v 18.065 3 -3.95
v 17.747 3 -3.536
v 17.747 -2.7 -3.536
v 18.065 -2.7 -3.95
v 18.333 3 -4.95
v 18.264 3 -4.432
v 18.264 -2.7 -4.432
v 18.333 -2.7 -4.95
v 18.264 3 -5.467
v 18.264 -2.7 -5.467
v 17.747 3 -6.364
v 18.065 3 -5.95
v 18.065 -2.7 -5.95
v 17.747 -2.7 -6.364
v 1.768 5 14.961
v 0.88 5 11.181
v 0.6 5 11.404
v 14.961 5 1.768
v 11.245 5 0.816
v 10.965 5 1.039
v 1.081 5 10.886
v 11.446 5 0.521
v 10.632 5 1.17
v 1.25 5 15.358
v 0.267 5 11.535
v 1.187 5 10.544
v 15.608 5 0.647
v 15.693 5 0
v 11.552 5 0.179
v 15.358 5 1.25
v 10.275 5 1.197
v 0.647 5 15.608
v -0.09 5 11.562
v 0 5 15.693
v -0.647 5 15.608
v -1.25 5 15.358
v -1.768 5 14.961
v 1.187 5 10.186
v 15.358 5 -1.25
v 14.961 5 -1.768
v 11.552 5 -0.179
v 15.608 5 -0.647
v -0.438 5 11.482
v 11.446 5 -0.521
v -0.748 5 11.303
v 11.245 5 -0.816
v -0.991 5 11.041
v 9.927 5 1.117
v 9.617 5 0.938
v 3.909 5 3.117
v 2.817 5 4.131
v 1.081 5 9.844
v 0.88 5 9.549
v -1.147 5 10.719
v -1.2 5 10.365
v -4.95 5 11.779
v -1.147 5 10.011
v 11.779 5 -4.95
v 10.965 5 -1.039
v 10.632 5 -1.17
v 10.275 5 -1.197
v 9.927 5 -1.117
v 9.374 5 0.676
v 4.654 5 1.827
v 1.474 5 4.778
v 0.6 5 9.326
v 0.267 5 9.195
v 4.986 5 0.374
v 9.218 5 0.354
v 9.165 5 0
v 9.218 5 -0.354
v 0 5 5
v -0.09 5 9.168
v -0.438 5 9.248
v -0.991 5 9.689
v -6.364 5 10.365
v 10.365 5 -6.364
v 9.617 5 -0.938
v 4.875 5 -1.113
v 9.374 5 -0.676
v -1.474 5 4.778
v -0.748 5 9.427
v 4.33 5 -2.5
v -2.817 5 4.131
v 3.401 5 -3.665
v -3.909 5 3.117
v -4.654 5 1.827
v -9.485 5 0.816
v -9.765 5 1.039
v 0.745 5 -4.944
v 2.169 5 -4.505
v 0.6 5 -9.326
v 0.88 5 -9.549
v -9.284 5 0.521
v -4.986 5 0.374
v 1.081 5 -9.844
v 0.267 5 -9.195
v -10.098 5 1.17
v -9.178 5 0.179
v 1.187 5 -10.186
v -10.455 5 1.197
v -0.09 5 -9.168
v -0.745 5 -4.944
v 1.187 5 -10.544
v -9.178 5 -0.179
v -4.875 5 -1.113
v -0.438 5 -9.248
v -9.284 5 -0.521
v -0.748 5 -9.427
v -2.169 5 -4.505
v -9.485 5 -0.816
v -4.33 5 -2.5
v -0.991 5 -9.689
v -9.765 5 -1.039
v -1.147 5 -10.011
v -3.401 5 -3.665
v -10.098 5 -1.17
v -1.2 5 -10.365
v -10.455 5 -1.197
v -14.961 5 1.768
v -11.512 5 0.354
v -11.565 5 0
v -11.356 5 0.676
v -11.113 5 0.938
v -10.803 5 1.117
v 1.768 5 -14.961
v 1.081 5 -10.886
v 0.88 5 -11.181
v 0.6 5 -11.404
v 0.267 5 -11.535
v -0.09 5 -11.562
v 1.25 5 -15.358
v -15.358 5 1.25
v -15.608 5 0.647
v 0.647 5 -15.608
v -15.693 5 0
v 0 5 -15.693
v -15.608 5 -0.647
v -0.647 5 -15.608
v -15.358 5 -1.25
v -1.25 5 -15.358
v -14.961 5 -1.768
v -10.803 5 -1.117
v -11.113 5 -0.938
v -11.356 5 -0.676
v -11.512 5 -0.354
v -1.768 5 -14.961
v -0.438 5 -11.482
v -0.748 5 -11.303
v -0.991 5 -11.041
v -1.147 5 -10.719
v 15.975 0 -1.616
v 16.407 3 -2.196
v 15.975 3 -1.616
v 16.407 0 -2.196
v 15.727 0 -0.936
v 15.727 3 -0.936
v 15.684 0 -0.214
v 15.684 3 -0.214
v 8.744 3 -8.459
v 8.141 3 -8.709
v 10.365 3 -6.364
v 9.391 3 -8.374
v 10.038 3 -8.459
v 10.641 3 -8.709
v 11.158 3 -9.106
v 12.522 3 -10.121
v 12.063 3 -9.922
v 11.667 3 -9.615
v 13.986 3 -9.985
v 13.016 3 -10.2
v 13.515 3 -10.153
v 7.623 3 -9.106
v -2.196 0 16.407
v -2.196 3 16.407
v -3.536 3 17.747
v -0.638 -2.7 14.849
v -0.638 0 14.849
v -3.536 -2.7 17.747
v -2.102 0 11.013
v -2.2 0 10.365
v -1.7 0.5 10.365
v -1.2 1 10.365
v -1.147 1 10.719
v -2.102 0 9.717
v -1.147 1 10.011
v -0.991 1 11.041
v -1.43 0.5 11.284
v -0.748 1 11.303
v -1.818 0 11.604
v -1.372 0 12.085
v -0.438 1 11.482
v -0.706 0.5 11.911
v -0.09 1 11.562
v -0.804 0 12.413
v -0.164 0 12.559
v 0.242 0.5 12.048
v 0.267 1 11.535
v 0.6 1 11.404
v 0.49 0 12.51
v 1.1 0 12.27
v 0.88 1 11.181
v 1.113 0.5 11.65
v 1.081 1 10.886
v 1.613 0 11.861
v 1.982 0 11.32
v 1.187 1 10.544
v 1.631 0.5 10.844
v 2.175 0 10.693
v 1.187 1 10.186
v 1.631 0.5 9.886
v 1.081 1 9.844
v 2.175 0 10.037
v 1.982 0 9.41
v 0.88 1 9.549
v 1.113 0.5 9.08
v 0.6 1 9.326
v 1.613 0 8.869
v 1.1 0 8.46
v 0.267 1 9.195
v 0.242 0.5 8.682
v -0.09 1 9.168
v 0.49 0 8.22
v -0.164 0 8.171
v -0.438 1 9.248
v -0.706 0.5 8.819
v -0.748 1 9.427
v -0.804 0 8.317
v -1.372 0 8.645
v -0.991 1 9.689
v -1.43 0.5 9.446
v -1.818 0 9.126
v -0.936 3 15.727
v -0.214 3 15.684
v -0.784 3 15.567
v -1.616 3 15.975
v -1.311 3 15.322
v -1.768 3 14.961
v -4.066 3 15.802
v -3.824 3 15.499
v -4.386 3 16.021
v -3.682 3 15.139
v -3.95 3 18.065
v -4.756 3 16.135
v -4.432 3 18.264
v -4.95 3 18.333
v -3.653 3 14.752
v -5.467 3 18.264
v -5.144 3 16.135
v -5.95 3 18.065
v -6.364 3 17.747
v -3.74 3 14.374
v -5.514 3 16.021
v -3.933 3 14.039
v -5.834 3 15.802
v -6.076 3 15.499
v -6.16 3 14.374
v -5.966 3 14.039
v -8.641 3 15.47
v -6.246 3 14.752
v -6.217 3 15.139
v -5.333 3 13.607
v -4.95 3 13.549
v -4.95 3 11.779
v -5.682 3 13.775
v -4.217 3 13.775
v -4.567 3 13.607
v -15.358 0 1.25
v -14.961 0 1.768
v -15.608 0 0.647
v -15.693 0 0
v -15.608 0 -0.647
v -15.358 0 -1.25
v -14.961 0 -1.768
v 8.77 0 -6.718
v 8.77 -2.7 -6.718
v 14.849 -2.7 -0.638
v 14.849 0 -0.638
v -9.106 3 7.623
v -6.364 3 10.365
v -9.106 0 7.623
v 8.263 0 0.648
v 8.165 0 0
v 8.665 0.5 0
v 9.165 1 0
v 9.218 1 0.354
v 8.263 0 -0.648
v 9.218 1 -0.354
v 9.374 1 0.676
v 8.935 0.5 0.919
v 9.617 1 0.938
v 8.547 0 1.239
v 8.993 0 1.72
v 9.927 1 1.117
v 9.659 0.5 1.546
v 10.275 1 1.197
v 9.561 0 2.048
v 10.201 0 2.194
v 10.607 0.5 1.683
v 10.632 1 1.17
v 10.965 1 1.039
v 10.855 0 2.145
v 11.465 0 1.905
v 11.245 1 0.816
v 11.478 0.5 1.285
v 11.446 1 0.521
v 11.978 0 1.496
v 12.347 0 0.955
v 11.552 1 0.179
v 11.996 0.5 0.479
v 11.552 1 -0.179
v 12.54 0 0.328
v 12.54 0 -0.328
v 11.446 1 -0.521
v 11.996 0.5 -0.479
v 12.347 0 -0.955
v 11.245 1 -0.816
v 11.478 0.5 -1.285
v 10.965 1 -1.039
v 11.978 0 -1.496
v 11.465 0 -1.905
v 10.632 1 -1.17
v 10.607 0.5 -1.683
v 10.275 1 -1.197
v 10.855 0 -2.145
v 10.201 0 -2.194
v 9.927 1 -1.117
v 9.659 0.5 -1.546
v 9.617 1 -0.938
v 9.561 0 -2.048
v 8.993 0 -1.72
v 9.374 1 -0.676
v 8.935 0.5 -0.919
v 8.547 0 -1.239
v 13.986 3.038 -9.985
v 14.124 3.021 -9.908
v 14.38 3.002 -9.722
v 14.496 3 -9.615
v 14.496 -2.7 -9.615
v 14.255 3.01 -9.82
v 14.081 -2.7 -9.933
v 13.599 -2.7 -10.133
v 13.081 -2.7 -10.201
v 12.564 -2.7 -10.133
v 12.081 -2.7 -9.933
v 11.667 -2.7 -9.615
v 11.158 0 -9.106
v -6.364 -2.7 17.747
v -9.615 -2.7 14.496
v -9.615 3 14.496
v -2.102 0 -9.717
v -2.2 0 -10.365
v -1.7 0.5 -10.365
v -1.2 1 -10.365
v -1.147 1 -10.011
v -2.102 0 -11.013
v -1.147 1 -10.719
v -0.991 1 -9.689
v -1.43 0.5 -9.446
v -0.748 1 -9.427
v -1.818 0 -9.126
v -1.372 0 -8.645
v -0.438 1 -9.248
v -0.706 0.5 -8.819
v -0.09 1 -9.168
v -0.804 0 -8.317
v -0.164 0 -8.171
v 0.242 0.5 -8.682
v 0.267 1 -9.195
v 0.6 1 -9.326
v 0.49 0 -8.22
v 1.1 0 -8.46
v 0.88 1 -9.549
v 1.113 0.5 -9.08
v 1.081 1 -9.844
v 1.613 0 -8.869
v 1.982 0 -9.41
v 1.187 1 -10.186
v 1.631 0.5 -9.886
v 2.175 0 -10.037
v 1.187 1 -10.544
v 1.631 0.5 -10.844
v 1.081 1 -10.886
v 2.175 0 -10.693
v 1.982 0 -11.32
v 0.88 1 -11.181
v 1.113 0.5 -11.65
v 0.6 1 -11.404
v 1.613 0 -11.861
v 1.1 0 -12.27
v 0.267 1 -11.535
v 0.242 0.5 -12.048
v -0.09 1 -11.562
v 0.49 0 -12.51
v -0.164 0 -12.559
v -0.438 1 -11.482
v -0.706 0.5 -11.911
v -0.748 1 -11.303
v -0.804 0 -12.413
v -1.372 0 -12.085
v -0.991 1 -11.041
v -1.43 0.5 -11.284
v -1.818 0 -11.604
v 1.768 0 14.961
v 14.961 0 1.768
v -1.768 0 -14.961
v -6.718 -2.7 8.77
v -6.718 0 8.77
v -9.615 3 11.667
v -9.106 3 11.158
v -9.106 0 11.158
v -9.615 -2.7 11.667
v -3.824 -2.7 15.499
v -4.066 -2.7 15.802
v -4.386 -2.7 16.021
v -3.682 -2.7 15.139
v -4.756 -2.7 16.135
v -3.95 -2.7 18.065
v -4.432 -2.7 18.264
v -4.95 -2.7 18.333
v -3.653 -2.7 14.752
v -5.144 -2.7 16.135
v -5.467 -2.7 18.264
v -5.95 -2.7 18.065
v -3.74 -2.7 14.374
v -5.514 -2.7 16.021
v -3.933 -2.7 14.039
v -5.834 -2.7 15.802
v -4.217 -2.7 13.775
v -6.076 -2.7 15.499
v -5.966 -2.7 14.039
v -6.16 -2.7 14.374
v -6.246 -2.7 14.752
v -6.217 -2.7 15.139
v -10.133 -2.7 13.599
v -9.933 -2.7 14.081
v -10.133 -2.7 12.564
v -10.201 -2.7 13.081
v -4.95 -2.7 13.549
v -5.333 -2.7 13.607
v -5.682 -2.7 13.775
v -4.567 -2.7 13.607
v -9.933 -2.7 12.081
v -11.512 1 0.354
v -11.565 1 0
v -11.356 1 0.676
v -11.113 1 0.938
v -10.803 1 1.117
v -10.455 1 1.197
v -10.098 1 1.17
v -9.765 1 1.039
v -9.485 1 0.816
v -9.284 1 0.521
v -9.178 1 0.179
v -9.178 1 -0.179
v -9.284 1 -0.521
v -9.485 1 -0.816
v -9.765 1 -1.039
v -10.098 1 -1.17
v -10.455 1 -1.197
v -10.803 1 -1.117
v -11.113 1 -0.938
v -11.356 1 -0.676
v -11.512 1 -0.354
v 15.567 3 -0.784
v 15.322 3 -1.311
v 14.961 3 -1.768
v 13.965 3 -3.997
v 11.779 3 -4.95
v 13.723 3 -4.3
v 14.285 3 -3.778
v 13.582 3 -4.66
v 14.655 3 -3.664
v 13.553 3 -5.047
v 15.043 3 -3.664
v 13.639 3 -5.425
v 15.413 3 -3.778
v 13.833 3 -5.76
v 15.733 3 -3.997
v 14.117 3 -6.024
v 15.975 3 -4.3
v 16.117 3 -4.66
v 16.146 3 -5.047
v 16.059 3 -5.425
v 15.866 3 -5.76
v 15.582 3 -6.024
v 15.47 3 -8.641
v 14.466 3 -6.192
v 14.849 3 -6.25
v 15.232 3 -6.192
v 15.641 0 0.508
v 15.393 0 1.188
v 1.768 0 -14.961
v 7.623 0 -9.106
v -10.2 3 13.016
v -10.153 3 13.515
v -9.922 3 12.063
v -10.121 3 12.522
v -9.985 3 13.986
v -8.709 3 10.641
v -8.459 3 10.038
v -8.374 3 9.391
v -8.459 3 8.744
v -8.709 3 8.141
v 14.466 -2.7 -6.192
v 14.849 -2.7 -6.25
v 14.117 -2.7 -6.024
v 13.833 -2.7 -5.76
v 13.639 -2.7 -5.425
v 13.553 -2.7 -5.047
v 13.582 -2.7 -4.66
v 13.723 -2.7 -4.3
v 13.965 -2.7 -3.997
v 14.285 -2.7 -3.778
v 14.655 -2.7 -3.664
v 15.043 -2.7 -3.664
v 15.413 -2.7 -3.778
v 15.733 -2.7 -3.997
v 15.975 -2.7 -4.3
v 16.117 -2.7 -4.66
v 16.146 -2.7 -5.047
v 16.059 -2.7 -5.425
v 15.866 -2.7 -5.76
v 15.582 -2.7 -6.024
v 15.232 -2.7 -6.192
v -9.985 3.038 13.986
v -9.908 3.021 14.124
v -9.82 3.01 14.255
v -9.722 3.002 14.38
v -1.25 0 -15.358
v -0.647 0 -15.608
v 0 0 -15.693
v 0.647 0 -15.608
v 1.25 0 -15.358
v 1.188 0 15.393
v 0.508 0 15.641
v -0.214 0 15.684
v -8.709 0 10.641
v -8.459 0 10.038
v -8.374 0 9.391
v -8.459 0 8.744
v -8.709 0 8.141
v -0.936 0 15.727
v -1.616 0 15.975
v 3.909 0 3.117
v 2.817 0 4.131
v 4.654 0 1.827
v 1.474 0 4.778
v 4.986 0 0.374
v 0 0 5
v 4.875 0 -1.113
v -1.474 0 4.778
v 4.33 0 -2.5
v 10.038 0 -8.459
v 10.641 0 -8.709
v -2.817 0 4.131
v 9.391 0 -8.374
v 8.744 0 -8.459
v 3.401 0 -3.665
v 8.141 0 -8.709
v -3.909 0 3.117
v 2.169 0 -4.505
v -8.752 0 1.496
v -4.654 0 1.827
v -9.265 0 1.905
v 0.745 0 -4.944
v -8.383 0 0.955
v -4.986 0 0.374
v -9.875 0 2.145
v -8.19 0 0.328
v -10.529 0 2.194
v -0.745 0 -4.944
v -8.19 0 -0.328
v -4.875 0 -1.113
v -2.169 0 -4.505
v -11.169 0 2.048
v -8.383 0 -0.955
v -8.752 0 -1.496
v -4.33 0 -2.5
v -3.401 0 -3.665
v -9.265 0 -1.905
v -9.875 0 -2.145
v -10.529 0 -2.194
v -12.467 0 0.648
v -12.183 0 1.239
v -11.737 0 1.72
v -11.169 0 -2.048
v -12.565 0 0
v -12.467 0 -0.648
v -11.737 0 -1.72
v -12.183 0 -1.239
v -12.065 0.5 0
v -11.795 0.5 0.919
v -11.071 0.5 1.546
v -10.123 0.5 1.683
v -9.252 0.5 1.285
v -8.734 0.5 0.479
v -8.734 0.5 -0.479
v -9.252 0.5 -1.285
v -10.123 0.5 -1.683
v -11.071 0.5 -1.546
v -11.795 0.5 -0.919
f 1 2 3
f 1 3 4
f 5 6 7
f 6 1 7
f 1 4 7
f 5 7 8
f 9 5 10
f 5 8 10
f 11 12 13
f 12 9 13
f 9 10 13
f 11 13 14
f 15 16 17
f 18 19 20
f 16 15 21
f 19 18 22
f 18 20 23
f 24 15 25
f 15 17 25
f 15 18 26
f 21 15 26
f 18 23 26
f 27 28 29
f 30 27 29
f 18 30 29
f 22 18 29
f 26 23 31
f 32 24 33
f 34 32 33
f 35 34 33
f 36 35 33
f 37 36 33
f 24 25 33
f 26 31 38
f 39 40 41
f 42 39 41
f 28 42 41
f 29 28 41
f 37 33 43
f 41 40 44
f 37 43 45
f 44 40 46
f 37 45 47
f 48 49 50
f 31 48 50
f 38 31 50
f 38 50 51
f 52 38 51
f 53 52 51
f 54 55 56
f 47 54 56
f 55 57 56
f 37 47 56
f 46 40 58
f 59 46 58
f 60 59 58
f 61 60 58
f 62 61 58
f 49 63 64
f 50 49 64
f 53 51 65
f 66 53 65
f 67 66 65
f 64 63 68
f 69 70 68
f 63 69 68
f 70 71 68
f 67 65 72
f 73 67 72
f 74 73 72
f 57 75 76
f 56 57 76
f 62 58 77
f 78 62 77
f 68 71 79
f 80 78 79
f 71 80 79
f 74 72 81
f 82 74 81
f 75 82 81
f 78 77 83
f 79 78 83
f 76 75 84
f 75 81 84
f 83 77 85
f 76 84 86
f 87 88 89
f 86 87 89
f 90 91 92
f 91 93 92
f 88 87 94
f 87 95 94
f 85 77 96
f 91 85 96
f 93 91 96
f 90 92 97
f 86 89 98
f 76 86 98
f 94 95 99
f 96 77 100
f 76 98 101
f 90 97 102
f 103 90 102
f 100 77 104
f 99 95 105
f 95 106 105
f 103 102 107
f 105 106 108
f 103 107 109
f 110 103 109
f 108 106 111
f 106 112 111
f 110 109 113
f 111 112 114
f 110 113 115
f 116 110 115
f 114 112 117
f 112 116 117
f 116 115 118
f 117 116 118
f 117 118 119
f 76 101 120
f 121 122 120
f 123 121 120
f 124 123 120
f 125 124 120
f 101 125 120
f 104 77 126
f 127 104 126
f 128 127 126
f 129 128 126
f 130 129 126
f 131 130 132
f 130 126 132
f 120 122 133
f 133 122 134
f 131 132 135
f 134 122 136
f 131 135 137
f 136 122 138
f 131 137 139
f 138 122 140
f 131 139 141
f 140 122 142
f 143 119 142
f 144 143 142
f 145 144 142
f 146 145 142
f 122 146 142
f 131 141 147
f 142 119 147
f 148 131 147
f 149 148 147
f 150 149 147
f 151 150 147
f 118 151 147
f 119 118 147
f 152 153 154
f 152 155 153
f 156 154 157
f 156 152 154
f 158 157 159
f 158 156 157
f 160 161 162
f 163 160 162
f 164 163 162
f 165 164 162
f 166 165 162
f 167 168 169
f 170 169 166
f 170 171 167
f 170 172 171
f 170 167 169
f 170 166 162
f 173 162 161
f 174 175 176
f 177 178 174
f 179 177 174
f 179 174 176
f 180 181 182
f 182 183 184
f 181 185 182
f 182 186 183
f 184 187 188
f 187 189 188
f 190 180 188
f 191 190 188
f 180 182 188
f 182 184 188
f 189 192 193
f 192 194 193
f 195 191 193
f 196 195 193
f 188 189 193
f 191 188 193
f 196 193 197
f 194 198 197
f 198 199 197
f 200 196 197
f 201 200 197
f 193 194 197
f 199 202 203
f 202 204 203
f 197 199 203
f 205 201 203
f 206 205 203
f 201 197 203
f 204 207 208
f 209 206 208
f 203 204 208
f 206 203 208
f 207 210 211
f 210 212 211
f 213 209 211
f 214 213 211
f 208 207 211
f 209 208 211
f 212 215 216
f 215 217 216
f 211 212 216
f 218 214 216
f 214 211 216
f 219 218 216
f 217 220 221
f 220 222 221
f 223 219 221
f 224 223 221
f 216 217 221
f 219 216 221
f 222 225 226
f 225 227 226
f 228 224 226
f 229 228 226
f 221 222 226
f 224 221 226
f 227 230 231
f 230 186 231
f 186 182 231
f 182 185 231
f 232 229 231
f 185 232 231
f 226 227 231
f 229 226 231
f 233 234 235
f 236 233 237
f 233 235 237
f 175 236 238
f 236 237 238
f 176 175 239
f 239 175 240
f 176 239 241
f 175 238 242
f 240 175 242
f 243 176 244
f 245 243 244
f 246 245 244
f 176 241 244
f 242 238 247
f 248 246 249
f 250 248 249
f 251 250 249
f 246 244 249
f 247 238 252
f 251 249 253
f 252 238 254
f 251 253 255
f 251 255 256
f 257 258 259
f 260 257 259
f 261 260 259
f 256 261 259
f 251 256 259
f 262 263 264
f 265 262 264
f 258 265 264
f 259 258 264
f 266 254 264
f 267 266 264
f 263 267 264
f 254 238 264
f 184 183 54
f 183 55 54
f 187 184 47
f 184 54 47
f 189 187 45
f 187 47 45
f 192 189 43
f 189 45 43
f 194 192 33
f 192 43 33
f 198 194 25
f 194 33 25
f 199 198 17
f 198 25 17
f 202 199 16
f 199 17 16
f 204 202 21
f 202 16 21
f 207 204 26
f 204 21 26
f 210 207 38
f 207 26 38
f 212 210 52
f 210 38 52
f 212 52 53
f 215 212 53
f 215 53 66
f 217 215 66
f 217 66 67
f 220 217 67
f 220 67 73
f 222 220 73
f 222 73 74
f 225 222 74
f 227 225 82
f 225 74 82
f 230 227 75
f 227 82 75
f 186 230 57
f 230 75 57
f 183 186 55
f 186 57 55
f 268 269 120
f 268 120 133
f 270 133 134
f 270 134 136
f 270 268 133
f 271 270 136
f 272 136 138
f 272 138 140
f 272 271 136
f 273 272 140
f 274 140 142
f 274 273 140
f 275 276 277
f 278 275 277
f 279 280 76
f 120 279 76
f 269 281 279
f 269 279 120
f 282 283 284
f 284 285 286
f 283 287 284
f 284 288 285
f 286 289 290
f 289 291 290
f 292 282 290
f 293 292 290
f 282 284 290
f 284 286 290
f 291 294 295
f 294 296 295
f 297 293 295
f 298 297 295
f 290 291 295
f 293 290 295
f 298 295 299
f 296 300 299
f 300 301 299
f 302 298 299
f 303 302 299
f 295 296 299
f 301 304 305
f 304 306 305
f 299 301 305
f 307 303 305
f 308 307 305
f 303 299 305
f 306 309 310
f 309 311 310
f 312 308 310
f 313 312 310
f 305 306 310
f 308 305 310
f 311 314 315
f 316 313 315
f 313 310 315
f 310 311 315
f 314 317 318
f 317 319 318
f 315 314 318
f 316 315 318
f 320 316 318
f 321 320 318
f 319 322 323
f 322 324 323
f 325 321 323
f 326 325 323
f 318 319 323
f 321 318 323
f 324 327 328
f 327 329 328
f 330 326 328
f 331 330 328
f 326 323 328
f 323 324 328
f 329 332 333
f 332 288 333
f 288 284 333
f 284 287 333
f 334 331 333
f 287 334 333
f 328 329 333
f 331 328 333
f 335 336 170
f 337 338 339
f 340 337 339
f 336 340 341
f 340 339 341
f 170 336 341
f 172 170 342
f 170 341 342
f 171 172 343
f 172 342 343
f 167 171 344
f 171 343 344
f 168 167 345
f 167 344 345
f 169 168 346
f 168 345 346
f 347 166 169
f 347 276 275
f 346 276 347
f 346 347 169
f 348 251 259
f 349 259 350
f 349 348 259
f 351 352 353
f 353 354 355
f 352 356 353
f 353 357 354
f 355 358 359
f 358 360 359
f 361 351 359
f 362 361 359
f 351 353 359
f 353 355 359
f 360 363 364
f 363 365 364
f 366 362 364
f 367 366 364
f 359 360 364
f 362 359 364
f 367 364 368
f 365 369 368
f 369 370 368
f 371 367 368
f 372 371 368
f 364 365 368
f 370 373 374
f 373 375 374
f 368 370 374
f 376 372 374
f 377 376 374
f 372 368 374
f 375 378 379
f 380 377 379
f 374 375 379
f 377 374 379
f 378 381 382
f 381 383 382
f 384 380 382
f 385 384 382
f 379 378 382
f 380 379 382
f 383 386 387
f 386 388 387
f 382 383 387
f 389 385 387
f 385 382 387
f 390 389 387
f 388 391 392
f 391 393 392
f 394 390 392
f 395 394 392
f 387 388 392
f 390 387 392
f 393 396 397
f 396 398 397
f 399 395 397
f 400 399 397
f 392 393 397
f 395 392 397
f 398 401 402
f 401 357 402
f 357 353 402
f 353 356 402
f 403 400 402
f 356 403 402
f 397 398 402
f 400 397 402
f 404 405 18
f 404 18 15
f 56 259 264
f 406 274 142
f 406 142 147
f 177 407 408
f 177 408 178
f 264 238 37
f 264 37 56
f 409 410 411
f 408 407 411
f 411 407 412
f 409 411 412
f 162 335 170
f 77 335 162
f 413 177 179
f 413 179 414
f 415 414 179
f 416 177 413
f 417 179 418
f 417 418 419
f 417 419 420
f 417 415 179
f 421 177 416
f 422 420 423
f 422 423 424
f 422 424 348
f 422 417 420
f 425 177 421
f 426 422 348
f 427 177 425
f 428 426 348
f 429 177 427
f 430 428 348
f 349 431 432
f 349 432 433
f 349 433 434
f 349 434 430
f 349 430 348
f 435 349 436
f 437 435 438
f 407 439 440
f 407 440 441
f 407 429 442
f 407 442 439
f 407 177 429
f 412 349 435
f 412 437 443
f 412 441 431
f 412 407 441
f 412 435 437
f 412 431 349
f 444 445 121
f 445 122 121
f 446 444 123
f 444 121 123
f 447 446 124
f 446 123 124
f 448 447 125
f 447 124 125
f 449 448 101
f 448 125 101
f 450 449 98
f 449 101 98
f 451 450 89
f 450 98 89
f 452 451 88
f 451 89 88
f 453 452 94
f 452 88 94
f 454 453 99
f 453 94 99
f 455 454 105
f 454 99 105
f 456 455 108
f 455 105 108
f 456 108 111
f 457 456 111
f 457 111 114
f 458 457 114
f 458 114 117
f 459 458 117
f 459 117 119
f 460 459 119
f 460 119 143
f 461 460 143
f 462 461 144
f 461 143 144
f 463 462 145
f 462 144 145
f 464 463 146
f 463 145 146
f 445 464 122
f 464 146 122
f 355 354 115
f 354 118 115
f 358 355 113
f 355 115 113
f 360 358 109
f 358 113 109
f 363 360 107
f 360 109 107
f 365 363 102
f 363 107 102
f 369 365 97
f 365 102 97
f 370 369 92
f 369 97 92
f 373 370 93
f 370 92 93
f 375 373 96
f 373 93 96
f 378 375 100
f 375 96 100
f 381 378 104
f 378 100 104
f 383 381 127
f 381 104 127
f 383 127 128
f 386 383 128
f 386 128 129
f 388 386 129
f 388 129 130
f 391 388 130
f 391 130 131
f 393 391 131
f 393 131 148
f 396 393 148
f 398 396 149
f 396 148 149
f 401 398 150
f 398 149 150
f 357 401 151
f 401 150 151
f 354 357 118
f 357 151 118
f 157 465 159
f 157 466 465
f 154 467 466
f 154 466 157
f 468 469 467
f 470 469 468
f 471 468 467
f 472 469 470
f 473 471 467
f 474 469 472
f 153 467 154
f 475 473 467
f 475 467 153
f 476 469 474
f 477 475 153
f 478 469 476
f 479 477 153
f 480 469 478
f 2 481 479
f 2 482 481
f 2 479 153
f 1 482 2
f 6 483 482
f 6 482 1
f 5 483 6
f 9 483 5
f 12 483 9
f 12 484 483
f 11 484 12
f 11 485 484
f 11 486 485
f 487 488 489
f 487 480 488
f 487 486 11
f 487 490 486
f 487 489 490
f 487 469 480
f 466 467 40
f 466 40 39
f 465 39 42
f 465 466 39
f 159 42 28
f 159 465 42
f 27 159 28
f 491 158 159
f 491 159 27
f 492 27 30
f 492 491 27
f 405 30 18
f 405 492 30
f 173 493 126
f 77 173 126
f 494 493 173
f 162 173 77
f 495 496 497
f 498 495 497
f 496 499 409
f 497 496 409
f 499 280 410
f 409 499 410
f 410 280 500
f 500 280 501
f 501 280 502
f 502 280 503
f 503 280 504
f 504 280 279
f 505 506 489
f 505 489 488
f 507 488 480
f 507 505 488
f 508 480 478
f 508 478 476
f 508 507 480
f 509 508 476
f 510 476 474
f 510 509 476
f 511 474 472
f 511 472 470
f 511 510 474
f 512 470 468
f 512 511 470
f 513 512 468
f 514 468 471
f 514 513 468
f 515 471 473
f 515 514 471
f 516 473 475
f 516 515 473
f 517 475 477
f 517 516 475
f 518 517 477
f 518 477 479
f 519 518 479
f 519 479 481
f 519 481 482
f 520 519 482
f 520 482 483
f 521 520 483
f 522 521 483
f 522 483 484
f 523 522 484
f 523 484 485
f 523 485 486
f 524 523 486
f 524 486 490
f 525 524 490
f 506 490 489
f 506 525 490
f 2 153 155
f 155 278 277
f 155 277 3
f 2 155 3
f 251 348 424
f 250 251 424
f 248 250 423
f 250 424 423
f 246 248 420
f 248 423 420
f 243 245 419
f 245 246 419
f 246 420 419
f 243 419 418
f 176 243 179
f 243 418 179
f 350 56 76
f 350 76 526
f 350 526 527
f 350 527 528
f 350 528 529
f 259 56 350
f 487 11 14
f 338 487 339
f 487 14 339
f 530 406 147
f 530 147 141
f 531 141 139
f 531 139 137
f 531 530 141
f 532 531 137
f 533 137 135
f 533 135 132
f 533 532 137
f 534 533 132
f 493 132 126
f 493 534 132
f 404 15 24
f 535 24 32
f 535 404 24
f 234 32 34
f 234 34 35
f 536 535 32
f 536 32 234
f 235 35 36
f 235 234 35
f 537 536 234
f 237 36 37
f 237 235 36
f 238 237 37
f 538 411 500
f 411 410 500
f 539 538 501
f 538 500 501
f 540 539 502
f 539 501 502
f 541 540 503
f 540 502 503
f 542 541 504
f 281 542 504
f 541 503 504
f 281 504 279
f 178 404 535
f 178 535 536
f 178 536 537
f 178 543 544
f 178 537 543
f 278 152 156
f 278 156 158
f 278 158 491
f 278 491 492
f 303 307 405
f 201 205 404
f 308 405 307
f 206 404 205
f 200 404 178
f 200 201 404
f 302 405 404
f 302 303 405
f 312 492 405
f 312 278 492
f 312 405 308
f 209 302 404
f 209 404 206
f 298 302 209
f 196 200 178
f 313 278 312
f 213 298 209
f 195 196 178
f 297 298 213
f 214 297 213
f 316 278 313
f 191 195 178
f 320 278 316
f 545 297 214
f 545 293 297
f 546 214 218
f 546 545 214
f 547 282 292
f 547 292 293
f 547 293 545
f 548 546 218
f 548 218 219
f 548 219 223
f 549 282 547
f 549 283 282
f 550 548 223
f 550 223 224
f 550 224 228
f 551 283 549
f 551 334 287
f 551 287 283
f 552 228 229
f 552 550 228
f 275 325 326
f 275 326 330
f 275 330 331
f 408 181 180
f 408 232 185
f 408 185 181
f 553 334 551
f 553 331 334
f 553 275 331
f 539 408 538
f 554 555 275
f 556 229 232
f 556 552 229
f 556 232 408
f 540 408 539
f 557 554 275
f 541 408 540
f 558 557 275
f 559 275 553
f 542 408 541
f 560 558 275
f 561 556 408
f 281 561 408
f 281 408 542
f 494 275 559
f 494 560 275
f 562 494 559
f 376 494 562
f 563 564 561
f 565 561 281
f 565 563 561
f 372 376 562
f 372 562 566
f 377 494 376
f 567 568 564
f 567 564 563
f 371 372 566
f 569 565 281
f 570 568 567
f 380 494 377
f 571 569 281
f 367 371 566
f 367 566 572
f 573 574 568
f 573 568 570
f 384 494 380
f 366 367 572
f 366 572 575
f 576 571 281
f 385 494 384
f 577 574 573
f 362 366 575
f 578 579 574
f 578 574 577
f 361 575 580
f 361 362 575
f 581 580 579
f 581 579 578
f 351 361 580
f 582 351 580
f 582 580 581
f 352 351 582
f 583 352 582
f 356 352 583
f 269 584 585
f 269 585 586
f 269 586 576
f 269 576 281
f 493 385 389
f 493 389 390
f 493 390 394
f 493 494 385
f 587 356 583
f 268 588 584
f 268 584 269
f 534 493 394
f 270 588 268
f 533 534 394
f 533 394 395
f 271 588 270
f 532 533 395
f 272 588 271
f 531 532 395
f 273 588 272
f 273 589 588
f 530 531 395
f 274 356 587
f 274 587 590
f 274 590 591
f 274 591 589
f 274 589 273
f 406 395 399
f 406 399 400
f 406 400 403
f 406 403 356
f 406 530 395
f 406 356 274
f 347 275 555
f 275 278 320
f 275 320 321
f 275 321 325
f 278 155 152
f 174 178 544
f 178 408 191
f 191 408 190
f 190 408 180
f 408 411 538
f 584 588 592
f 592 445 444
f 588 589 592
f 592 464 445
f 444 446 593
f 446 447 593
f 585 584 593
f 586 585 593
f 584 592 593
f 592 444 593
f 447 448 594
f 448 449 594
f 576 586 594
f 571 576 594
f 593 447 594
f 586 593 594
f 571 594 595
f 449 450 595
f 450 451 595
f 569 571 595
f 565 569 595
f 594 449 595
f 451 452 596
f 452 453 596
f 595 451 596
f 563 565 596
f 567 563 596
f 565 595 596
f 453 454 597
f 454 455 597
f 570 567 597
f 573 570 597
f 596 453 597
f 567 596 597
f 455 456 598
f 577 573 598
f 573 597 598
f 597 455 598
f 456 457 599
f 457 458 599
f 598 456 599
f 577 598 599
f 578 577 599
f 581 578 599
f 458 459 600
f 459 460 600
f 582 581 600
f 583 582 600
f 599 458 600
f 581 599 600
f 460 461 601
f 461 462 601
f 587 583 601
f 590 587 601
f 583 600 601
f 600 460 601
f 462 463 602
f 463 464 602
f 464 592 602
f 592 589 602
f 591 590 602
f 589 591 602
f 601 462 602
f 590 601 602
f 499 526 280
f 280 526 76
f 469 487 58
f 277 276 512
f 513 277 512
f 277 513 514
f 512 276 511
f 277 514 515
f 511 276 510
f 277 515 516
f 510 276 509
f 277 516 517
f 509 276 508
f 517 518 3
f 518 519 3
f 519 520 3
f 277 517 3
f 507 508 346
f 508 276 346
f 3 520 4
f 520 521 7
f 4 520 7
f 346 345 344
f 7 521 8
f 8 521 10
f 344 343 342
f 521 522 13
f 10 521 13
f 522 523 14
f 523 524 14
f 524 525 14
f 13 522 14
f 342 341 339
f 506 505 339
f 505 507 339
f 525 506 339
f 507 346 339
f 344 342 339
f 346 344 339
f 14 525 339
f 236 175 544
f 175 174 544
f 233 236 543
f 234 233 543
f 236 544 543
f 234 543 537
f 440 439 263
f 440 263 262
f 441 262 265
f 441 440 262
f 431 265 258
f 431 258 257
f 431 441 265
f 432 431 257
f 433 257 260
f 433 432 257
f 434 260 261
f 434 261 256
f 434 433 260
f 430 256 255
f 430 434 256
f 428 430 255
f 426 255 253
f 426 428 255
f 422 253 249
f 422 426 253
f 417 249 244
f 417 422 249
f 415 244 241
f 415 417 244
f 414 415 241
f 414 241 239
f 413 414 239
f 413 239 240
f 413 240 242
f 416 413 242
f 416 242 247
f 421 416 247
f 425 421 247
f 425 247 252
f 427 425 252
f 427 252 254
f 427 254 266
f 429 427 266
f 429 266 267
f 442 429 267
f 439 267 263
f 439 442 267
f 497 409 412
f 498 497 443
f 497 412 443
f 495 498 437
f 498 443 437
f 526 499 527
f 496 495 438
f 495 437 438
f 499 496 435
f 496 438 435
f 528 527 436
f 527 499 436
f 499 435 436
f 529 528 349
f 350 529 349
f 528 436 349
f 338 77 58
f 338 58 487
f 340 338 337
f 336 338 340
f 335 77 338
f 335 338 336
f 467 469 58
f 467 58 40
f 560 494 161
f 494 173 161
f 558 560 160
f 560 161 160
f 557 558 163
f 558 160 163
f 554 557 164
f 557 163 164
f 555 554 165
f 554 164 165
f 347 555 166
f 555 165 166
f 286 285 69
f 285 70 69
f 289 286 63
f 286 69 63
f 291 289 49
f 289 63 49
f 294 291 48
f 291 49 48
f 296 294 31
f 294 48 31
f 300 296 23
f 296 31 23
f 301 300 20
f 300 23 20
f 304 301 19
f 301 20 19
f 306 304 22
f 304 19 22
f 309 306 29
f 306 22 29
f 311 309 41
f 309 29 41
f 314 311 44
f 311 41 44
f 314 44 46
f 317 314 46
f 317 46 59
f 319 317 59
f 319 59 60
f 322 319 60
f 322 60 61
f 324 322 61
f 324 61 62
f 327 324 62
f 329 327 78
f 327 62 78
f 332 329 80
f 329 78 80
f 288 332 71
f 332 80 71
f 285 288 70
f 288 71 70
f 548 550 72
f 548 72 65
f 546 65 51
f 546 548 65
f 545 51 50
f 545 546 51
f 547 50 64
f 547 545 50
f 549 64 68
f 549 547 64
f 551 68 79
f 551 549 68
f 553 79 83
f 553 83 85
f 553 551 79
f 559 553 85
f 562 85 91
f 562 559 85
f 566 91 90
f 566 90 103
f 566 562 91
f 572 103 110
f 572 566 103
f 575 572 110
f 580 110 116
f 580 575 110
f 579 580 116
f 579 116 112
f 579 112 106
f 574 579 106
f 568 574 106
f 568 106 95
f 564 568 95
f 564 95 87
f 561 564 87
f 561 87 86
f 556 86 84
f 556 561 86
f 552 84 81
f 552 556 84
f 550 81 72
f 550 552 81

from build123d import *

# Parameters (mm, degrees)
SKETCH1_R                                       = 0.5
SKETCH1_R_2                                     = 5
BOSS_EXTRUDE1_DEPTH                             = 5
SKETCH3_R                                       = 1.3
BOSS_EXTRUDE4_DEPTH                             = 5.7
BOSS_EXTRUDE6_DEPTH                             = 1
FILLET1_R                                       = 2.5
FILLET2_R                                       = 2
CSK_FOR_M2_FLAT_HEAD_MACHINE_SCREW5_D           = 2.4
CSK_FOR_M2_FLAT_HEAD_MACHINE_SCREW5_DEPTH       = 42.93
CSK_FOR_M2_FLAT_HEAD_MACHINE_SCREW5_CSINK_D     = 4.4
CSK_FOR_M2_FLAT_HEAD_MACHINE_SCREW5_CSINK_ANGLE = 90
CSK_FOR_M2_FLAT_HEAD_MACHINE_SCREW5_TIP         = 0.721032743


with BuildPart() as part:
    # Sketch1 → Boss-Extrude1 (new body)
    with BuildSketch(Plane(origin=(0, 0, 0), x_dir=(1, 0, 0), z_dir=(0, 1, 0))):
        with BuildLine():
            Line((1.767766953, 14.961194078), (14.961194078, 1.767766953))
            ThreePointArc((14.961194078, 1.767766953), (15.693427125, 0), (14.961194078, -1.767766953))
            Line((14.961194078, -1.767766953), (1.767766953, -14.961194078))
            ThreePointArc((1.767766953, -14.961194078), (0, -15.693427125), (-1.767766953, -14.961194078))
            Line((-1.767766953, -14.961194078), (-14.961194078, -1.767766953))
            ThreePointArc((-14.961194078, -1.767766953), (-15.693427125, 0), (-14.961194078, 1.767766953))
            Line((-14.961194078, 1.767766953), (-1.767766953, 14.961194078))
            ThreePointArc((-1.767766953, 14.961194078), (0, 15.693427125), (1.767766953, 14.961194078))
        make_face()
        with Locations(Location((0, 10.365, 0), (0, 0, 270))):
            Circle(SKETCH1_R, mode=Mode.SUBTRACT)
        with Locations(Location((0, -10.365, 0), (0, 0, 270))):
            Circle(SKETCH1_R, mode=Mode.SUBTRACT)
        with Locations(Location((10.365, 0, 0), (0, 0, 270))):
            Circle(SKETCH1_R, mode=Mode.SUBTRACT)
        with Locations(Location((-10.365, 0, 0), (0, 0, 270))):
            Circle(SKETCH1_R, mode=Mode.SUBTRACT)
        with Locations(Location((0, 0, 0), (0, 0, 270))):
            Circle(SKETCH1_R_2, mode=Mode.SUBTRACT)
    extrude(amount=BOSS_EXTRUDE1_DEPTH)

    # Sketch3 → Boss-Extrude4 (add)
    # profile 1 of 4: a face of its own
    with BuildSketch(Plane(origin=(0, -2.7, 0), x_dir=(1, 0, 0), z_dir=(0, 1, 0))):
        Polygon((-4.949747468, -10.537489101), (-0.637994164, -14.849242405), (-4.949747468, -19.160995709), (-9.261500772, -14.849242405), align=None)
        with Locations(Location((-4.949747468, -14.849242405, 0), (0, 0, 90))):
            Circle(SKETCH3_R, mode=Mode.SUBTRACT)
    # profile 2 of 4: a face of its own
    with BuildSketch(Plane(origin=(0, -2.7, 0), x_dir=(1, 0, 0), z_dir=(0, 1, 0))):
        Polygon((-6.717514421, -8.769722148), (-11.029267725, -13.081475452), (-9.261500772, -14.849242405), (-4.949747468, -10.537489101), align=None)
    # profile 3 of 4: a face of its own
    with BuildSketch(Plane(origin=(0, -2.7, 0), x_dir=(1, 0, 0), z_dir=(0, 1, 0))):
        Polygon((19.160995709, 4.949747468), (14.849242405, 9.261500772), (10.537489101, 4.949747468), (14.849242405, 0.637994164), align=None)
        with Locations(Location((14.849242405, 4.949747468, 0), (0, 0, 90))):
            Circle(SKETCH3_R, mode=Mode.SUBTRACT)
    # profile 4 of 4: a face of its own
    with BuildSketch(Plane(origin=(0, -2.7, 0), x_dir=(1, 0, 0), z_dir=(0, 1, 0))):
        Polygon((13.081475452, 11.029267725), (14.849242405, 9.261500772), (10.537489101, 4.949747468), (8.769722148, 6.717514421), align=None)
    extrude(amount=BOSS_EXTRUDE4_DEPTH)


with BuildPart() as boss_extrude6_tool:
    # Sketch7 → Boss-Extrude6 (new, symmetric)
    with BuildSketch(Plane(origin=(2.707626069, -2.13e-07, 2.707626069), x_dir=(0.7071067811865474, 0, -0.7071067811865478), z_dir=(0.7071067811865467, -5.5755039757469385e-08, 0.7071067811865462))):
        Polygon((11.829161787, 5.00000052), (17.04887, 3.00000056), (11.829161787, 3.00000052), align=None)
        Polygon((-11.829161787, 5.00000052), (-17.04887, 3.00000056), (-11.829161787, 3.00000052), align=None)
    extrude(amount=BOSS_EXTRUDE6_DEPTH, both=True)


with BuildPart() as part_1:
    add(part.part)


with BuildPart() as part_2:
    # Boss-Extrude6: joined with boss_extrude6_tool
    add(part_1.part.fuse(boss_extrude6_tool.part, tol=0.00001))

    # Fillet1
    fillet1_edges = [part_2.edges().sort_by_distance(p)[0] for p in [
        (-7.338376652, 1.5, 9.390584379),
        (-1.184018869, 1.5, 15.395267109),
        (9.390584379, 1.5, -7.338376652),
        (15.395267109, 1.5, -1.184018869),
    ]]
    fillet(fillet1_edges, radius=FILLET1_R)

    # Fillet2
    # the kernel refuses this fillet: 2 mm, written as the material it takes off along each edge
    with BuildSketch(Plane(origin=(-4.949747468, -7.7, 19.160995709), x_dir=(-0.7071067811865471, 0, -0.707106781186548), z_dir=(0, 1, 0)), Plane(origin=(13.081475452, -7.7, -11.029267725), x_dir=(0.7071067811865476, 0, 0.7071067811865476), z_dir=(0, 1, 0))) as fillet2_piece_1:
        with BuildLine():
            CenterArc((FILLET2_R, -FILLET2_R), FILLET2_R, 90, 90)
            Line((0, -FILLET2_R), (0, 0))
            Line((0, 0), (FILLET2_R, 0))
        make_face()
    extrude(amount=15.7, mode=Mode.SUBTRACT)
    with BuildSketch(Plane(origin=(-11.029267725, -7.7, 13.081475452), x_dir=(0.707106781186547, 0, 0.7071067811865479), z_dir=(0, 1, 0)), Plane(origin=(19.160995709, -7.7, -4.949747468), x_dir=(-0.7071067811865482, 0, -0.7071067811865469), z_dir=(0, 1, 0))) as fillet2_piece_2:
        with BuildLine():
            CenterArc((FILLET2_R, FILLET2_R), FILLET2_R, 180, 90)
            Line((0, FILLET2_R), (0, 0))
            Line((0, 0), (FILLET2_R, 0))
        make_face()
    extrude(amount=15.7, mode=Mode.SUBTRACT)

    # CSK for M2 Flat Head Machine Screw5
    with Locations(Plane.XZ):
        with Locations((0, 10.365), (10.365, 0), (-10.365, 0), (0, -10.365)):
            CounterSinkHole(CSK_FOR_M2_FLAT_HEAD_MACHINE_SCREW5_D / 2, CSK_FOR_M2_FLAT_HEAD_MACHINE_SCREW5_CSINK_D / 2, depth=CSK_FOR_M2_FLAT_HEAD_MACHINE_SCREW5_DEPTH, counter_sink_angle=CSK_FOR_M2_FLAT_HEAD_MACHINE_SCREW5_CSINK_ANGLE)
            with Locations((0, 0, -(CSK_FOR_M2_FLAT_HEAD_MACHINE_SCREW5_DEPTH + CSK_FOR_M2_FLAT_HEAD_MACHINE_SCREW5_TIP / 2))):  # 118° drill point
                Cone(0, CSK_FOR_M2_FLAT_HEAD_MACHINE_SCREW5_D / 2, CSK_FOR_M2_FLAT_HEAD_MACHINE_SCREW5_TIP, mode=Mode.SUBTRACT)


solid = part_2.part
